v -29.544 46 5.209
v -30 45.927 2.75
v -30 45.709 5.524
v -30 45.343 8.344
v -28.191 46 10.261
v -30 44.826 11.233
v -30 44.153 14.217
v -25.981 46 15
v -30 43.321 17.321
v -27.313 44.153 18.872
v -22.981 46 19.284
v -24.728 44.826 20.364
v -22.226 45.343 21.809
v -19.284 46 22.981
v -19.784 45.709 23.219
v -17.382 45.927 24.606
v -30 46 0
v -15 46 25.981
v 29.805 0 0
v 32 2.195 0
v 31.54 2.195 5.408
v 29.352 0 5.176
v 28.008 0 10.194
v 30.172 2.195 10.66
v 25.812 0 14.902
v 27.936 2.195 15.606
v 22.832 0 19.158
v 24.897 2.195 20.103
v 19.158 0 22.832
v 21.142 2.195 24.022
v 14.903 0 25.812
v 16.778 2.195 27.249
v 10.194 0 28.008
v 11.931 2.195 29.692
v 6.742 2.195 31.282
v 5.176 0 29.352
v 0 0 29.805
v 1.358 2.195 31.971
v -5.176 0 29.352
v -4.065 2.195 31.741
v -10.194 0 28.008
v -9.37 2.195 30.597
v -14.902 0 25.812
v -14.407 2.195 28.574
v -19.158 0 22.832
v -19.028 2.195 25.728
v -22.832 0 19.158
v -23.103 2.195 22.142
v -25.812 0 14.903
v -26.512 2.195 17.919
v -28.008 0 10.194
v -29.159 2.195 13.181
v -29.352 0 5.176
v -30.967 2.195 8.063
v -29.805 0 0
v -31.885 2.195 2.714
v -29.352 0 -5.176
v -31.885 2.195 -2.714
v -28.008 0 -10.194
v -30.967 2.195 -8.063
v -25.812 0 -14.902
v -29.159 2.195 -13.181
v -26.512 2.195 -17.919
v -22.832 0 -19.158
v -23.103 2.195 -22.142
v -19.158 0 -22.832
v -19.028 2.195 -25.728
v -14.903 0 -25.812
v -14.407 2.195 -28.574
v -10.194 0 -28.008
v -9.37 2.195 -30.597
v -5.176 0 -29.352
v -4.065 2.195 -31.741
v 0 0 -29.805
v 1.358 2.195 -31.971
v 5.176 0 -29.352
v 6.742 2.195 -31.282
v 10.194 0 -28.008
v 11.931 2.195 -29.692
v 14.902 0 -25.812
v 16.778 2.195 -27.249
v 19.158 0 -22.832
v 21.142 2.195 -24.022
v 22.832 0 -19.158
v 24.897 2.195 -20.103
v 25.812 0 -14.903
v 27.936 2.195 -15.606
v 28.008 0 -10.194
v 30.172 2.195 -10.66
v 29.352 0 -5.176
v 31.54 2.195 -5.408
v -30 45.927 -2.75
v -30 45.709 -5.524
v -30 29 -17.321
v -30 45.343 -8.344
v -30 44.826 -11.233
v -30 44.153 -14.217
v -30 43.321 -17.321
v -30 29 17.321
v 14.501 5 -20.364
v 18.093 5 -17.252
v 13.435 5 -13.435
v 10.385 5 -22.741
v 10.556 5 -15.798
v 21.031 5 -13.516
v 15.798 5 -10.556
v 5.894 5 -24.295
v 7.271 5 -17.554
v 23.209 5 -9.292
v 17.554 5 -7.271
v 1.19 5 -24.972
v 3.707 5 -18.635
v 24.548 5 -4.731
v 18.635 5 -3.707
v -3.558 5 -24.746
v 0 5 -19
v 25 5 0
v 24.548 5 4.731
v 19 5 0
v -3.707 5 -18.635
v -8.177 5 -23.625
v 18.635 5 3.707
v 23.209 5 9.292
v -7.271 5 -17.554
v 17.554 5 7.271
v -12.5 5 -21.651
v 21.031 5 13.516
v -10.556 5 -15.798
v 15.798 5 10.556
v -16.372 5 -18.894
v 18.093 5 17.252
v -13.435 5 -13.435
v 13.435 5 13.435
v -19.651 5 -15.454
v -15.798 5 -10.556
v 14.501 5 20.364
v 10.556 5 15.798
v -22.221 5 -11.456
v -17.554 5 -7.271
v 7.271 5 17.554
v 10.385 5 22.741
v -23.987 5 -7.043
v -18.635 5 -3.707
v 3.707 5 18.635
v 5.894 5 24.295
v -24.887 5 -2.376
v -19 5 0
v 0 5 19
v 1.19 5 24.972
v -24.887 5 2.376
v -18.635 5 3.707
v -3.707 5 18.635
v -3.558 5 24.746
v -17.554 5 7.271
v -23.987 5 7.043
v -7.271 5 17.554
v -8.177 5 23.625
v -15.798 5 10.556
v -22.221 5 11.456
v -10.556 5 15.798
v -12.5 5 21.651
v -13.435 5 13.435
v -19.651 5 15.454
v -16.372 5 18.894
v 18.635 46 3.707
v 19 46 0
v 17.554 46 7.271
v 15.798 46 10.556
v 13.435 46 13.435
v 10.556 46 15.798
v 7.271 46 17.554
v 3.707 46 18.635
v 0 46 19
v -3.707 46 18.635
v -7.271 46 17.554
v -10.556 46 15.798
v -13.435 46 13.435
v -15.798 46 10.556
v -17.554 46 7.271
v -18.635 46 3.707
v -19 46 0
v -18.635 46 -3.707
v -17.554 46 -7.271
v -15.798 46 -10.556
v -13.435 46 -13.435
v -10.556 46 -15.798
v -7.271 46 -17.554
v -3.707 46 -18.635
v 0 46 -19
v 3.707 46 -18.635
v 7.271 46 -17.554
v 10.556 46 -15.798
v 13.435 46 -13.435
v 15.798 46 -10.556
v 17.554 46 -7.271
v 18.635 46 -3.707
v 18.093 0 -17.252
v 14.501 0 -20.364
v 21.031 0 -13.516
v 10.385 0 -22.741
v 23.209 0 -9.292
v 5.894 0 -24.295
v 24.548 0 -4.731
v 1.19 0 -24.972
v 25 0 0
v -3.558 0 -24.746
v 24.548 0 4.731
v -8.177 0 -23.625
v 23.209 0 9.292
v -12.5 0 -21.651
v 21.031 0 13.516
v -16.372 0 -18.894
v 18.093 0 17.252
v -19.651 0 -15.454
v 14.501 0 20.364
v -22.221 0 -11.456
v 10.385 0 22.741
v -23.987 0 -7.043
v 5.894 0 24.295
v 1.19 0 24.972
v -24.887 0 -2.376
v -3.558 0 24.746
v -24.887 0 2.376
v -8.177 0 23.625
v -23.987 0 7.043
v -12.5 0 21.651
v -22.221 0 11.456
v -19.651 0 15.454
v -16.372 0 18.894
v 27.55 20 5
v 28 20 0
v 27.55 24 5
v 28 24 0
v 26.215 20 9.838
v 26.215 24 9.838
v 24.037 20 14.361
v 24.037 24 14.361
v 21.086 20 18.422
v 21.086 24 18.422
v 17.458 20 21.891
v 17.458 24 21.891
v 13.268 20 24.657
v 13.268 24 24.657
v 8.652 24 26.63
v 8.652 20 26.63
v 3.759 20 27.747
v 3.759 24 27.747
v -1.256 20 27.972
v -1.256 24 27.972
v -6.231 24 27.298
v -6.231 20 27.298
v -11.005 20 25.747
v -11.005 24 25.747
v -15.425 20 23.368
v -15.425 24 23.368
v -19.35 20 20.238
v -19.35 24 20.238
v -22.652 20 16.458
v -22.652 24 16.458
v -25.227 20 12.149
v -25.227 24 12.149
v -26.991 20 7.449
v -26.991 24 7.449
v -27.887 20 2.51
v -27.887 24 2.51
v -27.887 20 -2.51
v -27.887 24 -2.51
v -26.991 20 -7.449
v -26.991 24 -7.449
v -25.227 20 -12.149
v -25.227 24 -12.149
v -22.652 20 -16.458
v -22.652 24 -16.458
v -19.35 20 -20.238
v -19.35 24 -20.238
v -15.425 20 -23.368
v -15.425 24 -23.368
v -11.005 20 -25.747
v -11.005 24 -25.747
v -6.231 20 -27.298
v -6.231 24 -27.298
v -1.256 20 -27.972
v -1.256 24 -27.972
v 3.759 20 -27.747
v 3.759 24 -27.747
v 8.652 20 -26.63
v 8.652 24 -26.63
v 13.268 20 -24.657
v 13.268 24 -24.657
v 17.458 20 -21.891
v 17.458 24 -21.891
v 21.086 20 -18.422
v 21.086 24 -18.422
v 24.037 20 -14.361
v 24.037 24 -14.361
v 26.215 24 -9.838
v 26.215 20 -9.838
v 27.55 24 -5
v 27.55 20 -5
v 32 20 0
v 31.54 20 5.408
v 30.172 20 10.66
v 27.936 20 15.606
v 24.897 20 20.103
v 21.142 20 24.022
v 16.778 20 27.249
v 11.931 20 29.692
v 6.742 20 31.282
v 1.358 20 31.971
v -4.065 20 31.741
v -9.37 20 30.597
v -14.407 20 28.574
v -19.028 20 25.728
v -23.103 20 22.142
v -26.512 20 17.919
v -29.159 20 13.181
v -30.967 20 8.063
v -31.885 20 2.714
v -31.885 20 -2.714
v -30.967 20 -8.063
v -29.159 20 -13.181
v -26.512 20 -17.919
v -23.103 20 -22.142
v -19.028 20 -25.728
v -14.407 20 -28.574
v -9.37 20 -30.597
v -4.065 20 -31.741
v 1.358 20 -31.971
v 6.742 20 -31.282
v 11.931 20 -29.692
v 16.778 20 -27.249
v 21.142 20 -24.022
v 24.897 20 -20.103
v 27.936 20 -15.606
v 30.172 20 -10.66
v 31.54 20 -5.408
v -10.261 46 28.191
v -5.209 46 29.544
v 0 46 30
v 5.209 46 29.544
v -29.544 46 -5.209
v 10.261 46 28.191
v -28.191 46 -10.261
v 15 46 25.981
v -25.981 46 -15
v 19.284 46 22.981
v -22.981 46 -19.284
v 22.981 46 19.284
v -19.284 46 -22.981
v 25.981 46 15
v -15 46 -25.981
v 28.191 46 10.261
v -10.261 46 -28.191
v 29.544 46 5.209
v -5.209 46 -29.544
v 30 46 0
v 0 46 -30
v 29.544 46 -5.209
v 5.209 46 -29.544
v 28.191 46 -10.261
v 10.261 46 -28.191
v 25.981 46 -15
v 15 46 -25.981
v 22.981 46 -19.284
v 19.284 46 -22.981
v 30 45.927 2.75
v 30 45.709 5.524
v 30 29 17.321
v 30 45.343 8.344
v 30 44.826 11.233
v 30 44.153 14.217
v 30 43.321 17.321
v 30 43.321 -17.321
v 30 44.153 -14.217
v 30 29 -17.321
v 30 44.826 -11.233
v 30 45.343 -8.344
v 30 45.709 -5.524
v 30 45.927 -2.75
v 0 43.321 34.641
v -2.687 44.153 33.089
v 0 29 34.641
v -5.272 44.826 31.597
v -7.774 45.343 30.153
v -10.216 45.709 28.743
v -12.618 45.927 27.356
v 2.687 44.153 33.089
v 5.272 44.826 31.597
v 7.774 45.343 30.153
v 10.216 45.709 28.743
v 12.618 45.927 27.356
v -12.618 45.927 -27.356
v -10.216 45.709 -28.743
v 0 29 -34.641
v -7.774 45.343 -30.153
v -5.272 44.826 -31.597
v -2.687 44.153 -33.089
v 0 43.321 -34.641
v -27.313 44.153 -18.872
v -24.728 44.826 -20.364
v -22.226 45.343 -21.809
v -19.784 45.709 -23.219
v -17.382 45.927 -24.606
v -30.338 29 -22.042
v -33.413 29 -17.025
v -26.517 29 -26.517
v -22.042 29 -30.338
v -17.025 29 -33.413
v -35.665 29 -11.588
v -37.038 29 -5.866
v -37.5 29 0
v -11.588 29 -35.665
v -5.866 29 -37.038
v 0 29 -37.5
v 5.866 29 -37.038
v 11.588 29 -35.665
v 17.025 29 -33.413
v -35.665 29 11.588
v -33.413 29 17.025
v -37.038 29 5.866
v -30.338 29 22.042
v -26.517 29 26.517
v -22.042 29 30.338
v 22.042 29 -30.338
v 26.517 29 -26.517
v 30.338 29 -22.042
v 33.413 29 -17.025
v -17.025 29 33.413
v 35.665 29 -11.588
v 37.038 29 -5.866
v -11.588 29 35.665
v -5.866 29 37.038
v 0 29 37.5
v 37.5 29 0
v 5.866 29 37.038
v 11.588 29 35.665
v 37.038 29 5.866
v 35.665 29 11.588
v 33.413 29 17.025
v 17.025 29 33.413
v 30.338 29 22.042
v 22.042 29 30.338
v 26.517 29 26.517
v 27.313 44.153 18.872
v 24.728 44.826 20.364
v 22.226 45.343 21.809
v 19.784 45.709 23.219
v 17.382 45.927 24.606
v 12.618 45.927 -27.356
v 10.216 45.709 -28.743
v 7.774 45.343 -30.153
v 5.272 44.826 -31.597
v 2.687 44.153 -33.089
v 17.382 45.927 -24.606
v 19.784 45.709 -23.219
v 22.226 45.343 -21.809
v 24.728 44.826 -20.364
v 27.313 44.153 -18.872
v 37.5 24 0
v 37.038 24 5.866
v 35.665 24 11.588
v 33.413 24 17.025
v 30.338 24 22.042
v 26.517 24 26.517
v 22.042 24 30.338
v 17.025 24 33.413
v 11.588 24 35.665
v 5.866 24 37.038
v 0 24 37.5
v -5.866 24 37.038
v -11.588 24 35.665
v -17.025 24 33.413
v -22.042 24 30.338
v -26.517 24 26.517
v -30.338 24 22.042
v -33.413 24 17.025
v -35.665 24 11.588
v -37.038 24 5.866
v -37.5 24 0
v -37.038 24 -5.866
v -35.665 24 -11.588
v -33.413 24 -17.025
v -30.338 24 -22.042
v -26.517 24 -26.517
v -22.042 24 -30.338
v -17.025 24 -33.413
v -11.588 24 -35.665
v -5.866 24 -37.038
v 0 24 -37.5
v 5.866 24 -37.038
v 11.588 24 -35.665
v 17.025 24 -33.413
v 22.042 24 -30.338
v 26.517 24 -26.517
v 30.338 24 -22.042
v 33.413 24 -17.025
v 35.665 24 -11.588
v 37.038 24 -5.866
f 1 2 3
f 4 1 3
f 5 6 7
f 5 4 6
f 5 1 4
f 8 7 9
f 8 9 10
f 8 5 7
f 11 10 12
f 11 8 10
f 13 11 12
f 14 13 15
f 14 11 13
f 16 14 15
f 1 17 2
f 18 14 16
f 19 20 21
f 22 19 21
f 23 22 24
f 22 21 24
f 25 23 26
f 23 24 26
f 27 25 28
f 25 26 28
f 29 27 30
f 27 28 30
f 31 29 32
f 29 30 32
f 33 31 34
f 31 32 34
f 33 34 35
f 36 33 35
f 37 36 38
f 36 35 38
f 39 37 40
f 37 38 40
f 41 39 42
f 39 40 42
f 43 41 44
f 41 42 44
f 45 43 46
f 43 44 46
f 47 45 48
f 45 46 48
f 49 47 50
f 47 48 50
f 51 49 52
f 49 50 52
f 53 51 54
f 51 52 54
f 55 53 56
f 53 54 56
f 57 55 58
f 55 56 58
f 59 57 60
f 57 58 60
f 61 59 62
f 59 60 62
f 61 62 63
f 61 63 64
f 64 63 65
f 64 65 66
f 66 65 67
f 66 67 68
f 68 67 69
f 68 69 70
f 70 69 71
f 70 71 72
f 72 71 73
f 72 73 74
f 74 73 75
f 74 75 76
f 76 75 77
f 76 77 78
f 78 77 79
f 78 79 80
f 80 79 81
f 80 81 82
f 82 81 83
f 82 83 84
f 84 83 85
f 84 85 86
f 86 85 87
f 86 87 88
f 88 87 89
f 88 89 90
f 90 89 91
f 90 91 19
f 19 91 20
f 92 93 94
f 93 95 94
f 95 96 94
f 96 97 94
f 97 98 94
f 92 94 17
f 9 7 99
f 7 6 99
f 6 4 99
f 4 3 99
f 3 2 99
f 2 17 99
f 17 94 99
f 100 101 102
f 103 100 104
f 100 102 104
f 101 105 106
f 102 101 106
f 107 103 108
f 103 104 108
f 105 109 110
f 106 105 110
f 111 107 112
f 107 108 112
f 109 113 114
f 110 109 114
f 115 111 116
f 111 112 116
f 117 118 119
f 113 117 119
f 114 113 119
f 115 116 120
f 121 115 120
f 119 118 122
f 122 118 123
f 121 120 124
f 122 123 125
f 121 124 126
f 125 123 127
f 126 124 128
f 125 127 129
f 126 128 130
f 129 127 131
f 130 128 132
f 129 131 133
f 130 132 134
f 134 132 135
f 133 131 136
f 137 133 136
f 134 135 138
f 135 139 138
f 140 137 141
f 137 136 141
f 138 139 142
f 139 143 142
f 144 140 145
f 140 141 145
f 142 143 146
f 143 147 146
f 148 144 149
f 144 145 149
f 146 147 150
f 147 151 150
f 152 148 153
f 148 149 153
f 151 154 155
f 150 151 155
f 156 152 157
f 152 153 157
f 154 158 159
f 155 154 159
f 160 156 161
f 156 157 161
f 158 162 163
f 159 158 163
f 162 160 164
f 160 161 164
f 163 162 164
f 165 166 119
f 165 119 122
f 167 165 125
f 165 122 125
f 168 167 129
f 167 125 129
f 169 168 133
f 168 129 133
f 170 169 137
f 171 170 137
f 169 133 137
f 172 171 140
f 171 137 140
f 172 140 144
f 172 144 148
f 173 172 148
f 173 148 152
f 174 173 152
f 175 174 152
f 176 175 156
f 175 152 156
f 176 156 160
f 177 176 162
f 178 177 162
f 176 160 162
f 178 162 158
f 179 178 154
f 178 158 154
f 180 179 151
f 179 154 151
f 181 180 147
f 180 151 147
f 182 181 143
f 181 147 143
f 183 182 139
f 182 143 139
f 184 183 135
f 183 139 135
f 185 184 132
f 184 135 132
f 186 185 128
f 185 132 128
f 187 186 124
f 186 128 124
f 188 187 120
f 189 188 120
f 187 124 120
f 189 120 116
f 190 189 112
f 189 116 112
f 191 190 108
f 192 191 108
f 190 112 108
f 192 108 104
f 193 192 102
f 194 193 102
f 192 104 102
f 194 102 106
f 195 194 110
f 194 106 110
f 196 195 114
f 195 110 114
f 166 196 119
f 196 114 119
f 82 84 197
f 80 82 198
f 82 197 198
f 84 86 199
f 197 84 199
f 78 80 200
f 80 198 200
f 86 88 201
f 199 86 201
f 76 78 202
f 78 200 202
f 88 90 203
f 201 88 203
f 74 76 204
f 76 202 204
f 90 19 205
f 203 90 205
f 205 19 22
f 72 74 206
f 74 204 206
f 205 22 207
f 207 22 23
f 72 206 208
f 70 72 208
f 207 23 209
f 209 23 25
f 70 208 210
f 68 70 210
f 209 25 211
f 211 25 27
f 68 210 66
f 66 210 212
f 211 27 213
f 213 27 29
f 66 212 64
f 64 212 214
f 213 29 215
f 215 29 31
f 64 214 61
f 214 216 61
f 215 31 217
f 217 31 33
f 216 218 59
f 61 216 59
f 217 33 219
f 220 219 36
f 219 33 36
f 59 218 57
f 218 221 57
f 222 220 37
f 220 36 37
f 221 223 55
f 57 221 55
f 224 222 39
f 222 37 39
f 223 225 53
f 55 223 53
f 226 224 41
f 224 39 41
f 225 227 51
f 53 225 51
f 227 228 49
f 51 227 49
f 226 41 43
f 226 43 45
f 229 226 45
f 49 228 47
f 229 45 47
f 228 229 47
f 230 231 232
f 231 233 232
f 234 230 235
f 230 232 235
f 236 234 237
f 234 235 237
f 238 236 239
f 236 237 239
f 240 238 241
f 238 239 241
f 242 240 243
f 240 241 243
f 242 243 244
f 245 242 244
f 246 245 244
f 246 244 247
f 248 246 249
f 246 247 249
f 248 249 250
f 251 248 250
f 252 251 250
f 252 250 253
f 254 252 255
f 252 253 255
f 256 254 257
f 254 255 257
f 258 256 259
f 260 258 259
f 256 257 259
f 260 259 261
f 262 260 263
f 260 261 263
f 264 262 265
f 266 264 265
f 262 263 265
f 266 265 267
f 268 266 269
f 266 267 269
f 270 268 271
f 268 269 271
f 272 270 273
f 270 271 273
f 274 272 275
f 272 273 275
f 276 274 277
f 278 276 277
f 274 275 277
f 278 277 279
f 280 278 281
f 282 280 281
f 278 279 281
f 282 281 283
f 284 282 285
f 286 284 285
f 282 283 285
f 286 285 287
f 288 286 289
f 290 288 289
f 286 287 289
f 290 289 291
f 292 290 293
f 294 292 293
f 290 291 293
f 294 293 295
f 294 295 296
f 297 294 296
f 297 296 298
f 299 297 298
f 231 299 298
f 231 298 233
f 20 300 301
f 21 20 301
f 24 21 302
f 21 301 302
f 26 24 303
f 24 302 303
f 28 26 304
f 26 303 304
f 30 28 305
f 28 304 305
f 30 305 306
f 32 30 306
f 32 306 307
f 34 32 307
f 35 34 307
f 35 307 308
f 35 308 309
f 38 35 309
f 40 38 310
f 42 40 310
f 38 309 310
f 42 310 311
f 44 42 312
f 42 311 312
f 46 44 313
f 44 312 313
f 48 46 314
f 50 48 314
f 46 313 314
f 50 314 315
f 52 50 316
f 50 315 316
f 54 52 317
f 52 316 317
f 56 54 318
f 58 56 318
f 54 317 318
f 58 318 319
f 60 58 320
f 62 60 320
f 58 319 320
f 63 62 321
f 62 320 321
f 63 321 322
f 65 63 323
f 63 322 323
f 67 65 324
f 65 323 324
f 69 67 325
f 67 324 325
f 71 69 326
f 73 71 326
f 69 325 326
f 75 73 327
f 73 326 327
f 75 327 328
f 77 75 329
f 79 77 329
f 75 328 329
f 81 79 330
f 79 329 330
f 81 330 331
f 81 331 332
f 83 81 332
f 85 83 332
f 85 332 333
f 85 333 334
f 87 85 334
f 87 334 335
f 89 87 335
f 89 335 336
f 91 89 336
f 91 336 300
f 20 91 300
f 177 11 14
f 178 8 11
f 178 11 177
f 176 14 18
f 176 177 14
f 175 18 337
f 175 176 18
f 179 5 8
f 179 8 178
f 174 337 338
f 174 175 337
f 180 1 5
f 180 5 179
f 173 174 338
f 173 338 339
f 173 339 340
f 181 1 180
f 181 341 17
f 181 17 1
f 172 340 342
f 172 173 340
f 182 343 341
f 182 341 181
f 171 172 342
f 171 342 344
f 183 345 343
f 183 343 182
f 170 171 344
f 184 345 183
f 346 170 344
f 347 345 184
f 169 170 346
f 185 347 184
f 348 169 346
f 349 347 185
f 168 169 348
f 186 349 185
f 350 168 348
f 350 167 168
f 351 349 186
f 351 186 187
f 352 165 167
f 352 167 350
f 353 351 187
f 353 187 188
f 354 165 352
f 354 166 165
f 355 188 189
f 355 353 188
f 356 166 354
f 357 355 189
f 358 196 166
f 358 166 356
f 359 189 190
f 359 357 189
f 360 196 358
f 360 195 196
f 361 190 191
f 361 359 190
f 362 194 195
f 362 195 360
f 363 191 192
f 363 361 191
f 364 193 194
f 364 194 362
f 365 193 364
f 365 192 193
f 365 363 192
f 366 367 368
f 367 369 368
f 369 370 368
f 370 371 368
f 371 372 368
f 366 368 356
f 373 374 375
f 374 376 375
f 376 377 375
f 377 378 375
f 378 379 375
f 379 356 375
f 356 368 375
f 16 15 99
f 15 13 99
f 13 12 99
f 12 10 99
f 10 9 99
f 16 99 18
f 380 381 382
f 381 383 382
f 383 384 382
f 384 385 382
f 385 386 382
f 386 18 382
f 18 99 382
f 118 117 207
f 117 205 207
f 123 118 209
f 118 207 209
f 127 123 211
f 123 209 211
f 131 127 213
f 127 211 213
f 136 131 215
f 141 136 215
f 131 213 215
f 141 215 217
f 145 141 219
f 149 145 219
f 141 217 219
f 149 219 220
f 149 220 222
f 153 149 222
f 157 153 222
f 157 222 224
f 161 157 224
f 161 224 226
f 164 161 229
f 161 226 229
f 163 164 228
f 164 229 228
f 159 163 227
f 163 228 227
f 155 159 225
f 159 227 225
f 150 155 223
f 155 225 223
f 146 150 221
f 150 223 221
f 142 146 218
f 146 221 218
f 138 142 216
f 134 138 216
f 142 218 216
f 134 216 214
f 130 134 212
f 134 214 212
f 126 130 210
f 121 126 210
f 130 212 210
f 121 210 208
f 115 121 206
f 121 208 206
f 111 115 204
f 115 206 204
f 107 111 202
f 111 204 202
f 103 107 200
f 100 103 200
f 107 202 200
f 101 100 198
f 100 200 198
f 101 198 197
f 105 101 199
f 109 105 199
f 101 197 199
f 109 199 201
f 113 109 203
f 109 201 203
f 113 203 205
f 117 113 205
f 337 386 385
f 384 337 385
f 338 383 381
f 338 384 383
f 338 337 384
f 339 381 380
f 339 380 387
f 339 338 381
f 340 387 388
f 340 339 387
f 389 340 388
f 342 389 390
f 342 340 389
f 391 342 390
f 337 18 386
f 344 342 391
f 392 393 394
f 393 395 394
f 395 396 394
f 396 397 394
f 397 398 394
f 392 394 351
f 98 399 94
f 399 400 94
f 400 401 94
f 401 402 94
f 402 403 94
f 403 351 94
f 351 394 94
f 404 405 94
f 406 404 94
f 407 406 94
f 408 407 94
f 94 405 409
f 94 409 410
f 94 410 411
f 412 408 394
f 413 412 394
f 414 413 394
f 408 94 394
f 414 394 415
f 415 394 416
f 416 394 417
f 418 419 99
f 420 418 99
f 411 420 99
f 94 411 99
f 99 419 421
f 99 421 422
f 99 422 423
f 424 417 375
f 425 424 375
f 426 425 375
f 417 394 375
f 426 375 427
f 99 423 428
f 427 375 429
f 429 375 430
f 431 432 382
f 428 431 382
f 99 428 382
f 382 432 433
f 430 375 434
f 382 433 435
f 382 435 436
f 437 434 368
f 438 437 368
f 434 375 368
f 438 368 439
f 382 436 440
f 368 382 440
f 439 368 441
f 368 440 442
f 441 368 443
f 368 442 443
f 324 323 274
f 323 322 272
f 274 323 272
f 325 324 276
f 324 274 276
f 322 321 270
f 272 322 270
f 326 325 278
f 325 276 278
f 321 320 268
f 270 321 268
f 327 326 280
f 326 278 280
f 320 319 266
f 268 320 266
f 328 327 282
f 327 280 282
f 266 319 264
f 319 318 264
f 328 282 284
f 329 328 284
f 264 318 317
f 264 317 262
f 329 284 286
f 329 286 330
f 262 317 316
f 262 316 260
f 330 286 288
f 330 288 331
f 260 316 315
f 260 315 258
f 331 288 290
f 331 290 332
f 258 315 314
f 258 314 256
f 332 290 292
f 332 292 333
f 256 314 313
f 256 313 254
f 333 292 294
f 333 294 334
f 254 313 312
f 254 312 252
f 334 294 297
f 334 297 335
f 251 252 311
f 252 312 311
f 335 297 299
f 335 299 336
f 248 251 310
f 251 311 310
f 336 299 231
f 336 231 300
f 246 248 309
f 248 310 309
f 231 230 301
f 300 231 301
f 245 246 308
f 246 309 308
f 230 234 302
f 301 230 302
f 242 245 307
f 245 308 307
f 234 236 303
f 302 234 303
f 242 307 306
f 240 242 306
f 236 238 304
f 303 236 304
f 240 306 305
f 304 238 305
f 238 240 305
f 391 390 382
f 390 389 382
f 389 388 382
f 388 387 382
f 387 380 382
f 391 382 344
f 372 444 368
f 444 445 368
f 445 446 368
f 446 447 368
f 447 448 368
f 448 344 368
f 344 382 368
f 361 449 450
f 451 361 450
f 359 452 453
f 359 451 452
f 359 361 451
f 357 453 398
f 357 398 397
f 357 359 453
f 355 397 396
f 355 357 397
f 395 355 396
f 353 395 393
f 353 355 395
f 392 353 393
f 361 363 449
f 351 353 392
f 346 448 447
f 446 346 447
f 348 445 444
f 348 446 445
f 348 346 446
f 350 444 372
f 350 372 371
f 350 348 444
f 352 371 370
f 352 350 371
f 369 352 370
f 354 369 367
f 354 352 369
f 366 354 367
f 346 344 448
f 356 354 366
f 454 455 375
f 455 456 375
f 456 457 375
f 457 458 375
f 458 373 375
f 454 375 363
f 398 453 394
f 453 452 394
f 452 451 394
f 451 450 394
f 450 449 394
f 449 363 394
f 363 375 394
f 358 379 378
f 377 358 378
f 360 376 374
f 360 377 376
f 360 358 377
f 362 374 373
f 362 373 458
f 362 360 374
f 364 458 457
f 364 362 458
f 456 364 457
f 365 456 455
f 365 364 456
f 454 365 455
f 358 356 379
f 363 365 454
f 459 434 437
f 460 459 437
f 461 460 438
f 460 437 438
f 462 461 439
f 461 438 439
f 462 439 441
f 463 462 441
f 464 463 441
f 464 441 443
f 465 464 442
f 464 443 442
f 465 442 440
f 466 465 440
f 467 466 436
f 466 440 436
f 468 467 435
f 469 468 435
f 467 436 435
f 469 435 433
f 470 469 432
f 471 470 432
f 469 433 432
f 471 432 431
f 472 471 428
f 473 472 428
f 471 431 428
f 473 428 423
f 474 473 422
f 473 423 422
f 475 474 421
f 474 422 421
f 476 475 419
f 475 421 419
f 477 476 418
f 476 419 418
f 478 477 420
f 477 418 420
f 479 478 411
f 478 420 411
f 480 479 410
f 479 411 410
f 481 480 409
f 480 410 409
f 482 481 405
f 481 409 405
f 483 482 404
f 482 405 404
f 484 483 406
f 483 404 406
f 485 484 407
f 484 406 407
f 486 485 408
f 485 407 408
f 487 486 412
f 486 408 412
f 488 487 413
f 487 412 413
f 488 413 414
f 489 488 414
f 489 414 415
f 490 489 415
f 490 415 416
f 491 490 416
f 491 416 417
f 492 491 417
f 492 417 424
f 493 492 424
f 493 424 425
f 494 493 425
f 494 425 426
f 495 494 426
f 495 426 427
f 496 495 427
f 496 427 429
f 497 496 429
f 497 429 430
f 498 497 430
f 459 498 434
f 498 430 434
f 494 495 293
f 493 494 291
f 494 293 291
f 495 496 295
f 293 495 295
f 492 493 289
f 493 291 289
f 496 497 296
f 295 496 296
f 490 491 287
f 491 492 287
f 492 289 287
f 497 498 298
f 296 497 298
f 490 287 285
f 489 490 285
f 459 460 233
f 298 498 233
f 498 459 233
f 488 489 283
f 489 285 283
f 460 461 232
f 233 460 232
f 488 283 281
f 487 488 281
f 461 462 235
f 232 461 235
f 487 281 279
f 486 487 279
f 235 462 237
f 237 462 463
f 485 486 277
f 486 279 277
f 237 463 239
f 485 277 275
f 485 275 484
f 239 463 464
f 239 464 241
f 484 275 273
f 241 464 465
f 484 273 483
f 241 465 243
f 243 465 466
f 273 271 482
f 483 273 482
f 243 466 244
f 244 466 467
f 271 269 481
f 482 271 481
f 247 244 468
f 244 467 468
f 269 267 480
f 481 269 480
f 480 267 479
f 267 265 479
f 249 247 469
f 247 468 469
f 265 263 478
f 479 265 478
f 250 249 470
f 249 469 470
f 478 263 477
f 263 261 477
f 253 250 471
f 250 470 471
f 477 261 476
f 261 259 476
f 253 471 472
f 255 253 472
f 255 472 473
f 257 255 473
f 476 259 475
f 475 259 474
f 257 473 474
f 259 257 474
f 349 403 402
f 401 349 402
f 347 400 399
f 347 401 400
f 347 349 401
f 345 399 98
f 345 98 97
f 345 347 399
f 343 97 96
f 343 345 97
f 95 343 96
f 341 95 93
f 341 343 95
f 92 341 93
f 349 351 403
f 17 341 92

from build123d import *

# Parameters (mm, degrees)
CHAMFER_1_SIZE      = 2.195
SKETCH_2_R          = 37.5
CUT_EXTRUDE_1_DEPTH = 18
SKETCH_3_R          = 25
EXTRUDE_1_DEPTH     = 17


with BuildPart() as part:
    # Эскиз1 → Повернуть1 (revolve)
    with BuildSketch(Plane.XY):
        Polygon((25, 0), (32, 0), (32, 20), (28, 20), (28, 24), (37.5, 24), (37.5, 29), (32.5, 29), (32.5, 42.535898385), (26.5, 46), (19, 46), (19, 5), (25, 5), align=None)
    revolve(axis=Axis((0, 57.260780425, 0), (0, -1, 0)))

    # Фаска1
    chamfer_1_edges = [part.edges().sort_by_distance(p)[0] for p in [
        (-32, 0, 0),
    ]]
    chamfer(chamfer_1_edges, length=CHAMFER_1_SIZE)

    # Эскиз2 → Вырез-Вытянуть1 (cut, through all)
    with BuildSketch(Plane(origin=(0, 29, 0), x_dir=(1, 0, 0), z_dir=(0, 1, 0))):
        Circle(SKETCH_2_R)
        Polygon((0, 34.641016151), (-30, 17.320508076), (-30, -17.320508076), (0, -34.641016151), (30, -17.320508076), (30, 17.320508076), align=None, mode=Mode.SUBTRACT)
    extrude(amount=CUT_EXTRUDE_1_DEPTH, mode=Mode.SUBTRACT)

    # Эскиз3 → Бобышка-Вытянуть1 (add)
    with BuildSketch(Plane(origin=(0, 29, 0), x_dir=(1, 0, 0), z_dir=(0, 1, 0))):
        Polygon((0, 34.641016151), (-30, 17.320508076), (-30, -17.320508076), (0, -34.641016151), (30, -17.320508076), (30, 17.320508076), align=None)
        Circle(SKETCH_3_R, mode=Mode.SUBTRACT)
    extrude(amount=EXTRUDE_1_DEPTH)

    # Эскиз4 → Вырез-Повернуть1 (revolve, cut)
    with BuildSketch(Plane.XY):
        Polygon((-30, 46), (-45, 46), (-45, 37.339745962), align=None)
    revolve(axis=Axis((0, 0, 0), (0, 1, 0)), mode=Mode.SUBTRACT)


solid = part.part
